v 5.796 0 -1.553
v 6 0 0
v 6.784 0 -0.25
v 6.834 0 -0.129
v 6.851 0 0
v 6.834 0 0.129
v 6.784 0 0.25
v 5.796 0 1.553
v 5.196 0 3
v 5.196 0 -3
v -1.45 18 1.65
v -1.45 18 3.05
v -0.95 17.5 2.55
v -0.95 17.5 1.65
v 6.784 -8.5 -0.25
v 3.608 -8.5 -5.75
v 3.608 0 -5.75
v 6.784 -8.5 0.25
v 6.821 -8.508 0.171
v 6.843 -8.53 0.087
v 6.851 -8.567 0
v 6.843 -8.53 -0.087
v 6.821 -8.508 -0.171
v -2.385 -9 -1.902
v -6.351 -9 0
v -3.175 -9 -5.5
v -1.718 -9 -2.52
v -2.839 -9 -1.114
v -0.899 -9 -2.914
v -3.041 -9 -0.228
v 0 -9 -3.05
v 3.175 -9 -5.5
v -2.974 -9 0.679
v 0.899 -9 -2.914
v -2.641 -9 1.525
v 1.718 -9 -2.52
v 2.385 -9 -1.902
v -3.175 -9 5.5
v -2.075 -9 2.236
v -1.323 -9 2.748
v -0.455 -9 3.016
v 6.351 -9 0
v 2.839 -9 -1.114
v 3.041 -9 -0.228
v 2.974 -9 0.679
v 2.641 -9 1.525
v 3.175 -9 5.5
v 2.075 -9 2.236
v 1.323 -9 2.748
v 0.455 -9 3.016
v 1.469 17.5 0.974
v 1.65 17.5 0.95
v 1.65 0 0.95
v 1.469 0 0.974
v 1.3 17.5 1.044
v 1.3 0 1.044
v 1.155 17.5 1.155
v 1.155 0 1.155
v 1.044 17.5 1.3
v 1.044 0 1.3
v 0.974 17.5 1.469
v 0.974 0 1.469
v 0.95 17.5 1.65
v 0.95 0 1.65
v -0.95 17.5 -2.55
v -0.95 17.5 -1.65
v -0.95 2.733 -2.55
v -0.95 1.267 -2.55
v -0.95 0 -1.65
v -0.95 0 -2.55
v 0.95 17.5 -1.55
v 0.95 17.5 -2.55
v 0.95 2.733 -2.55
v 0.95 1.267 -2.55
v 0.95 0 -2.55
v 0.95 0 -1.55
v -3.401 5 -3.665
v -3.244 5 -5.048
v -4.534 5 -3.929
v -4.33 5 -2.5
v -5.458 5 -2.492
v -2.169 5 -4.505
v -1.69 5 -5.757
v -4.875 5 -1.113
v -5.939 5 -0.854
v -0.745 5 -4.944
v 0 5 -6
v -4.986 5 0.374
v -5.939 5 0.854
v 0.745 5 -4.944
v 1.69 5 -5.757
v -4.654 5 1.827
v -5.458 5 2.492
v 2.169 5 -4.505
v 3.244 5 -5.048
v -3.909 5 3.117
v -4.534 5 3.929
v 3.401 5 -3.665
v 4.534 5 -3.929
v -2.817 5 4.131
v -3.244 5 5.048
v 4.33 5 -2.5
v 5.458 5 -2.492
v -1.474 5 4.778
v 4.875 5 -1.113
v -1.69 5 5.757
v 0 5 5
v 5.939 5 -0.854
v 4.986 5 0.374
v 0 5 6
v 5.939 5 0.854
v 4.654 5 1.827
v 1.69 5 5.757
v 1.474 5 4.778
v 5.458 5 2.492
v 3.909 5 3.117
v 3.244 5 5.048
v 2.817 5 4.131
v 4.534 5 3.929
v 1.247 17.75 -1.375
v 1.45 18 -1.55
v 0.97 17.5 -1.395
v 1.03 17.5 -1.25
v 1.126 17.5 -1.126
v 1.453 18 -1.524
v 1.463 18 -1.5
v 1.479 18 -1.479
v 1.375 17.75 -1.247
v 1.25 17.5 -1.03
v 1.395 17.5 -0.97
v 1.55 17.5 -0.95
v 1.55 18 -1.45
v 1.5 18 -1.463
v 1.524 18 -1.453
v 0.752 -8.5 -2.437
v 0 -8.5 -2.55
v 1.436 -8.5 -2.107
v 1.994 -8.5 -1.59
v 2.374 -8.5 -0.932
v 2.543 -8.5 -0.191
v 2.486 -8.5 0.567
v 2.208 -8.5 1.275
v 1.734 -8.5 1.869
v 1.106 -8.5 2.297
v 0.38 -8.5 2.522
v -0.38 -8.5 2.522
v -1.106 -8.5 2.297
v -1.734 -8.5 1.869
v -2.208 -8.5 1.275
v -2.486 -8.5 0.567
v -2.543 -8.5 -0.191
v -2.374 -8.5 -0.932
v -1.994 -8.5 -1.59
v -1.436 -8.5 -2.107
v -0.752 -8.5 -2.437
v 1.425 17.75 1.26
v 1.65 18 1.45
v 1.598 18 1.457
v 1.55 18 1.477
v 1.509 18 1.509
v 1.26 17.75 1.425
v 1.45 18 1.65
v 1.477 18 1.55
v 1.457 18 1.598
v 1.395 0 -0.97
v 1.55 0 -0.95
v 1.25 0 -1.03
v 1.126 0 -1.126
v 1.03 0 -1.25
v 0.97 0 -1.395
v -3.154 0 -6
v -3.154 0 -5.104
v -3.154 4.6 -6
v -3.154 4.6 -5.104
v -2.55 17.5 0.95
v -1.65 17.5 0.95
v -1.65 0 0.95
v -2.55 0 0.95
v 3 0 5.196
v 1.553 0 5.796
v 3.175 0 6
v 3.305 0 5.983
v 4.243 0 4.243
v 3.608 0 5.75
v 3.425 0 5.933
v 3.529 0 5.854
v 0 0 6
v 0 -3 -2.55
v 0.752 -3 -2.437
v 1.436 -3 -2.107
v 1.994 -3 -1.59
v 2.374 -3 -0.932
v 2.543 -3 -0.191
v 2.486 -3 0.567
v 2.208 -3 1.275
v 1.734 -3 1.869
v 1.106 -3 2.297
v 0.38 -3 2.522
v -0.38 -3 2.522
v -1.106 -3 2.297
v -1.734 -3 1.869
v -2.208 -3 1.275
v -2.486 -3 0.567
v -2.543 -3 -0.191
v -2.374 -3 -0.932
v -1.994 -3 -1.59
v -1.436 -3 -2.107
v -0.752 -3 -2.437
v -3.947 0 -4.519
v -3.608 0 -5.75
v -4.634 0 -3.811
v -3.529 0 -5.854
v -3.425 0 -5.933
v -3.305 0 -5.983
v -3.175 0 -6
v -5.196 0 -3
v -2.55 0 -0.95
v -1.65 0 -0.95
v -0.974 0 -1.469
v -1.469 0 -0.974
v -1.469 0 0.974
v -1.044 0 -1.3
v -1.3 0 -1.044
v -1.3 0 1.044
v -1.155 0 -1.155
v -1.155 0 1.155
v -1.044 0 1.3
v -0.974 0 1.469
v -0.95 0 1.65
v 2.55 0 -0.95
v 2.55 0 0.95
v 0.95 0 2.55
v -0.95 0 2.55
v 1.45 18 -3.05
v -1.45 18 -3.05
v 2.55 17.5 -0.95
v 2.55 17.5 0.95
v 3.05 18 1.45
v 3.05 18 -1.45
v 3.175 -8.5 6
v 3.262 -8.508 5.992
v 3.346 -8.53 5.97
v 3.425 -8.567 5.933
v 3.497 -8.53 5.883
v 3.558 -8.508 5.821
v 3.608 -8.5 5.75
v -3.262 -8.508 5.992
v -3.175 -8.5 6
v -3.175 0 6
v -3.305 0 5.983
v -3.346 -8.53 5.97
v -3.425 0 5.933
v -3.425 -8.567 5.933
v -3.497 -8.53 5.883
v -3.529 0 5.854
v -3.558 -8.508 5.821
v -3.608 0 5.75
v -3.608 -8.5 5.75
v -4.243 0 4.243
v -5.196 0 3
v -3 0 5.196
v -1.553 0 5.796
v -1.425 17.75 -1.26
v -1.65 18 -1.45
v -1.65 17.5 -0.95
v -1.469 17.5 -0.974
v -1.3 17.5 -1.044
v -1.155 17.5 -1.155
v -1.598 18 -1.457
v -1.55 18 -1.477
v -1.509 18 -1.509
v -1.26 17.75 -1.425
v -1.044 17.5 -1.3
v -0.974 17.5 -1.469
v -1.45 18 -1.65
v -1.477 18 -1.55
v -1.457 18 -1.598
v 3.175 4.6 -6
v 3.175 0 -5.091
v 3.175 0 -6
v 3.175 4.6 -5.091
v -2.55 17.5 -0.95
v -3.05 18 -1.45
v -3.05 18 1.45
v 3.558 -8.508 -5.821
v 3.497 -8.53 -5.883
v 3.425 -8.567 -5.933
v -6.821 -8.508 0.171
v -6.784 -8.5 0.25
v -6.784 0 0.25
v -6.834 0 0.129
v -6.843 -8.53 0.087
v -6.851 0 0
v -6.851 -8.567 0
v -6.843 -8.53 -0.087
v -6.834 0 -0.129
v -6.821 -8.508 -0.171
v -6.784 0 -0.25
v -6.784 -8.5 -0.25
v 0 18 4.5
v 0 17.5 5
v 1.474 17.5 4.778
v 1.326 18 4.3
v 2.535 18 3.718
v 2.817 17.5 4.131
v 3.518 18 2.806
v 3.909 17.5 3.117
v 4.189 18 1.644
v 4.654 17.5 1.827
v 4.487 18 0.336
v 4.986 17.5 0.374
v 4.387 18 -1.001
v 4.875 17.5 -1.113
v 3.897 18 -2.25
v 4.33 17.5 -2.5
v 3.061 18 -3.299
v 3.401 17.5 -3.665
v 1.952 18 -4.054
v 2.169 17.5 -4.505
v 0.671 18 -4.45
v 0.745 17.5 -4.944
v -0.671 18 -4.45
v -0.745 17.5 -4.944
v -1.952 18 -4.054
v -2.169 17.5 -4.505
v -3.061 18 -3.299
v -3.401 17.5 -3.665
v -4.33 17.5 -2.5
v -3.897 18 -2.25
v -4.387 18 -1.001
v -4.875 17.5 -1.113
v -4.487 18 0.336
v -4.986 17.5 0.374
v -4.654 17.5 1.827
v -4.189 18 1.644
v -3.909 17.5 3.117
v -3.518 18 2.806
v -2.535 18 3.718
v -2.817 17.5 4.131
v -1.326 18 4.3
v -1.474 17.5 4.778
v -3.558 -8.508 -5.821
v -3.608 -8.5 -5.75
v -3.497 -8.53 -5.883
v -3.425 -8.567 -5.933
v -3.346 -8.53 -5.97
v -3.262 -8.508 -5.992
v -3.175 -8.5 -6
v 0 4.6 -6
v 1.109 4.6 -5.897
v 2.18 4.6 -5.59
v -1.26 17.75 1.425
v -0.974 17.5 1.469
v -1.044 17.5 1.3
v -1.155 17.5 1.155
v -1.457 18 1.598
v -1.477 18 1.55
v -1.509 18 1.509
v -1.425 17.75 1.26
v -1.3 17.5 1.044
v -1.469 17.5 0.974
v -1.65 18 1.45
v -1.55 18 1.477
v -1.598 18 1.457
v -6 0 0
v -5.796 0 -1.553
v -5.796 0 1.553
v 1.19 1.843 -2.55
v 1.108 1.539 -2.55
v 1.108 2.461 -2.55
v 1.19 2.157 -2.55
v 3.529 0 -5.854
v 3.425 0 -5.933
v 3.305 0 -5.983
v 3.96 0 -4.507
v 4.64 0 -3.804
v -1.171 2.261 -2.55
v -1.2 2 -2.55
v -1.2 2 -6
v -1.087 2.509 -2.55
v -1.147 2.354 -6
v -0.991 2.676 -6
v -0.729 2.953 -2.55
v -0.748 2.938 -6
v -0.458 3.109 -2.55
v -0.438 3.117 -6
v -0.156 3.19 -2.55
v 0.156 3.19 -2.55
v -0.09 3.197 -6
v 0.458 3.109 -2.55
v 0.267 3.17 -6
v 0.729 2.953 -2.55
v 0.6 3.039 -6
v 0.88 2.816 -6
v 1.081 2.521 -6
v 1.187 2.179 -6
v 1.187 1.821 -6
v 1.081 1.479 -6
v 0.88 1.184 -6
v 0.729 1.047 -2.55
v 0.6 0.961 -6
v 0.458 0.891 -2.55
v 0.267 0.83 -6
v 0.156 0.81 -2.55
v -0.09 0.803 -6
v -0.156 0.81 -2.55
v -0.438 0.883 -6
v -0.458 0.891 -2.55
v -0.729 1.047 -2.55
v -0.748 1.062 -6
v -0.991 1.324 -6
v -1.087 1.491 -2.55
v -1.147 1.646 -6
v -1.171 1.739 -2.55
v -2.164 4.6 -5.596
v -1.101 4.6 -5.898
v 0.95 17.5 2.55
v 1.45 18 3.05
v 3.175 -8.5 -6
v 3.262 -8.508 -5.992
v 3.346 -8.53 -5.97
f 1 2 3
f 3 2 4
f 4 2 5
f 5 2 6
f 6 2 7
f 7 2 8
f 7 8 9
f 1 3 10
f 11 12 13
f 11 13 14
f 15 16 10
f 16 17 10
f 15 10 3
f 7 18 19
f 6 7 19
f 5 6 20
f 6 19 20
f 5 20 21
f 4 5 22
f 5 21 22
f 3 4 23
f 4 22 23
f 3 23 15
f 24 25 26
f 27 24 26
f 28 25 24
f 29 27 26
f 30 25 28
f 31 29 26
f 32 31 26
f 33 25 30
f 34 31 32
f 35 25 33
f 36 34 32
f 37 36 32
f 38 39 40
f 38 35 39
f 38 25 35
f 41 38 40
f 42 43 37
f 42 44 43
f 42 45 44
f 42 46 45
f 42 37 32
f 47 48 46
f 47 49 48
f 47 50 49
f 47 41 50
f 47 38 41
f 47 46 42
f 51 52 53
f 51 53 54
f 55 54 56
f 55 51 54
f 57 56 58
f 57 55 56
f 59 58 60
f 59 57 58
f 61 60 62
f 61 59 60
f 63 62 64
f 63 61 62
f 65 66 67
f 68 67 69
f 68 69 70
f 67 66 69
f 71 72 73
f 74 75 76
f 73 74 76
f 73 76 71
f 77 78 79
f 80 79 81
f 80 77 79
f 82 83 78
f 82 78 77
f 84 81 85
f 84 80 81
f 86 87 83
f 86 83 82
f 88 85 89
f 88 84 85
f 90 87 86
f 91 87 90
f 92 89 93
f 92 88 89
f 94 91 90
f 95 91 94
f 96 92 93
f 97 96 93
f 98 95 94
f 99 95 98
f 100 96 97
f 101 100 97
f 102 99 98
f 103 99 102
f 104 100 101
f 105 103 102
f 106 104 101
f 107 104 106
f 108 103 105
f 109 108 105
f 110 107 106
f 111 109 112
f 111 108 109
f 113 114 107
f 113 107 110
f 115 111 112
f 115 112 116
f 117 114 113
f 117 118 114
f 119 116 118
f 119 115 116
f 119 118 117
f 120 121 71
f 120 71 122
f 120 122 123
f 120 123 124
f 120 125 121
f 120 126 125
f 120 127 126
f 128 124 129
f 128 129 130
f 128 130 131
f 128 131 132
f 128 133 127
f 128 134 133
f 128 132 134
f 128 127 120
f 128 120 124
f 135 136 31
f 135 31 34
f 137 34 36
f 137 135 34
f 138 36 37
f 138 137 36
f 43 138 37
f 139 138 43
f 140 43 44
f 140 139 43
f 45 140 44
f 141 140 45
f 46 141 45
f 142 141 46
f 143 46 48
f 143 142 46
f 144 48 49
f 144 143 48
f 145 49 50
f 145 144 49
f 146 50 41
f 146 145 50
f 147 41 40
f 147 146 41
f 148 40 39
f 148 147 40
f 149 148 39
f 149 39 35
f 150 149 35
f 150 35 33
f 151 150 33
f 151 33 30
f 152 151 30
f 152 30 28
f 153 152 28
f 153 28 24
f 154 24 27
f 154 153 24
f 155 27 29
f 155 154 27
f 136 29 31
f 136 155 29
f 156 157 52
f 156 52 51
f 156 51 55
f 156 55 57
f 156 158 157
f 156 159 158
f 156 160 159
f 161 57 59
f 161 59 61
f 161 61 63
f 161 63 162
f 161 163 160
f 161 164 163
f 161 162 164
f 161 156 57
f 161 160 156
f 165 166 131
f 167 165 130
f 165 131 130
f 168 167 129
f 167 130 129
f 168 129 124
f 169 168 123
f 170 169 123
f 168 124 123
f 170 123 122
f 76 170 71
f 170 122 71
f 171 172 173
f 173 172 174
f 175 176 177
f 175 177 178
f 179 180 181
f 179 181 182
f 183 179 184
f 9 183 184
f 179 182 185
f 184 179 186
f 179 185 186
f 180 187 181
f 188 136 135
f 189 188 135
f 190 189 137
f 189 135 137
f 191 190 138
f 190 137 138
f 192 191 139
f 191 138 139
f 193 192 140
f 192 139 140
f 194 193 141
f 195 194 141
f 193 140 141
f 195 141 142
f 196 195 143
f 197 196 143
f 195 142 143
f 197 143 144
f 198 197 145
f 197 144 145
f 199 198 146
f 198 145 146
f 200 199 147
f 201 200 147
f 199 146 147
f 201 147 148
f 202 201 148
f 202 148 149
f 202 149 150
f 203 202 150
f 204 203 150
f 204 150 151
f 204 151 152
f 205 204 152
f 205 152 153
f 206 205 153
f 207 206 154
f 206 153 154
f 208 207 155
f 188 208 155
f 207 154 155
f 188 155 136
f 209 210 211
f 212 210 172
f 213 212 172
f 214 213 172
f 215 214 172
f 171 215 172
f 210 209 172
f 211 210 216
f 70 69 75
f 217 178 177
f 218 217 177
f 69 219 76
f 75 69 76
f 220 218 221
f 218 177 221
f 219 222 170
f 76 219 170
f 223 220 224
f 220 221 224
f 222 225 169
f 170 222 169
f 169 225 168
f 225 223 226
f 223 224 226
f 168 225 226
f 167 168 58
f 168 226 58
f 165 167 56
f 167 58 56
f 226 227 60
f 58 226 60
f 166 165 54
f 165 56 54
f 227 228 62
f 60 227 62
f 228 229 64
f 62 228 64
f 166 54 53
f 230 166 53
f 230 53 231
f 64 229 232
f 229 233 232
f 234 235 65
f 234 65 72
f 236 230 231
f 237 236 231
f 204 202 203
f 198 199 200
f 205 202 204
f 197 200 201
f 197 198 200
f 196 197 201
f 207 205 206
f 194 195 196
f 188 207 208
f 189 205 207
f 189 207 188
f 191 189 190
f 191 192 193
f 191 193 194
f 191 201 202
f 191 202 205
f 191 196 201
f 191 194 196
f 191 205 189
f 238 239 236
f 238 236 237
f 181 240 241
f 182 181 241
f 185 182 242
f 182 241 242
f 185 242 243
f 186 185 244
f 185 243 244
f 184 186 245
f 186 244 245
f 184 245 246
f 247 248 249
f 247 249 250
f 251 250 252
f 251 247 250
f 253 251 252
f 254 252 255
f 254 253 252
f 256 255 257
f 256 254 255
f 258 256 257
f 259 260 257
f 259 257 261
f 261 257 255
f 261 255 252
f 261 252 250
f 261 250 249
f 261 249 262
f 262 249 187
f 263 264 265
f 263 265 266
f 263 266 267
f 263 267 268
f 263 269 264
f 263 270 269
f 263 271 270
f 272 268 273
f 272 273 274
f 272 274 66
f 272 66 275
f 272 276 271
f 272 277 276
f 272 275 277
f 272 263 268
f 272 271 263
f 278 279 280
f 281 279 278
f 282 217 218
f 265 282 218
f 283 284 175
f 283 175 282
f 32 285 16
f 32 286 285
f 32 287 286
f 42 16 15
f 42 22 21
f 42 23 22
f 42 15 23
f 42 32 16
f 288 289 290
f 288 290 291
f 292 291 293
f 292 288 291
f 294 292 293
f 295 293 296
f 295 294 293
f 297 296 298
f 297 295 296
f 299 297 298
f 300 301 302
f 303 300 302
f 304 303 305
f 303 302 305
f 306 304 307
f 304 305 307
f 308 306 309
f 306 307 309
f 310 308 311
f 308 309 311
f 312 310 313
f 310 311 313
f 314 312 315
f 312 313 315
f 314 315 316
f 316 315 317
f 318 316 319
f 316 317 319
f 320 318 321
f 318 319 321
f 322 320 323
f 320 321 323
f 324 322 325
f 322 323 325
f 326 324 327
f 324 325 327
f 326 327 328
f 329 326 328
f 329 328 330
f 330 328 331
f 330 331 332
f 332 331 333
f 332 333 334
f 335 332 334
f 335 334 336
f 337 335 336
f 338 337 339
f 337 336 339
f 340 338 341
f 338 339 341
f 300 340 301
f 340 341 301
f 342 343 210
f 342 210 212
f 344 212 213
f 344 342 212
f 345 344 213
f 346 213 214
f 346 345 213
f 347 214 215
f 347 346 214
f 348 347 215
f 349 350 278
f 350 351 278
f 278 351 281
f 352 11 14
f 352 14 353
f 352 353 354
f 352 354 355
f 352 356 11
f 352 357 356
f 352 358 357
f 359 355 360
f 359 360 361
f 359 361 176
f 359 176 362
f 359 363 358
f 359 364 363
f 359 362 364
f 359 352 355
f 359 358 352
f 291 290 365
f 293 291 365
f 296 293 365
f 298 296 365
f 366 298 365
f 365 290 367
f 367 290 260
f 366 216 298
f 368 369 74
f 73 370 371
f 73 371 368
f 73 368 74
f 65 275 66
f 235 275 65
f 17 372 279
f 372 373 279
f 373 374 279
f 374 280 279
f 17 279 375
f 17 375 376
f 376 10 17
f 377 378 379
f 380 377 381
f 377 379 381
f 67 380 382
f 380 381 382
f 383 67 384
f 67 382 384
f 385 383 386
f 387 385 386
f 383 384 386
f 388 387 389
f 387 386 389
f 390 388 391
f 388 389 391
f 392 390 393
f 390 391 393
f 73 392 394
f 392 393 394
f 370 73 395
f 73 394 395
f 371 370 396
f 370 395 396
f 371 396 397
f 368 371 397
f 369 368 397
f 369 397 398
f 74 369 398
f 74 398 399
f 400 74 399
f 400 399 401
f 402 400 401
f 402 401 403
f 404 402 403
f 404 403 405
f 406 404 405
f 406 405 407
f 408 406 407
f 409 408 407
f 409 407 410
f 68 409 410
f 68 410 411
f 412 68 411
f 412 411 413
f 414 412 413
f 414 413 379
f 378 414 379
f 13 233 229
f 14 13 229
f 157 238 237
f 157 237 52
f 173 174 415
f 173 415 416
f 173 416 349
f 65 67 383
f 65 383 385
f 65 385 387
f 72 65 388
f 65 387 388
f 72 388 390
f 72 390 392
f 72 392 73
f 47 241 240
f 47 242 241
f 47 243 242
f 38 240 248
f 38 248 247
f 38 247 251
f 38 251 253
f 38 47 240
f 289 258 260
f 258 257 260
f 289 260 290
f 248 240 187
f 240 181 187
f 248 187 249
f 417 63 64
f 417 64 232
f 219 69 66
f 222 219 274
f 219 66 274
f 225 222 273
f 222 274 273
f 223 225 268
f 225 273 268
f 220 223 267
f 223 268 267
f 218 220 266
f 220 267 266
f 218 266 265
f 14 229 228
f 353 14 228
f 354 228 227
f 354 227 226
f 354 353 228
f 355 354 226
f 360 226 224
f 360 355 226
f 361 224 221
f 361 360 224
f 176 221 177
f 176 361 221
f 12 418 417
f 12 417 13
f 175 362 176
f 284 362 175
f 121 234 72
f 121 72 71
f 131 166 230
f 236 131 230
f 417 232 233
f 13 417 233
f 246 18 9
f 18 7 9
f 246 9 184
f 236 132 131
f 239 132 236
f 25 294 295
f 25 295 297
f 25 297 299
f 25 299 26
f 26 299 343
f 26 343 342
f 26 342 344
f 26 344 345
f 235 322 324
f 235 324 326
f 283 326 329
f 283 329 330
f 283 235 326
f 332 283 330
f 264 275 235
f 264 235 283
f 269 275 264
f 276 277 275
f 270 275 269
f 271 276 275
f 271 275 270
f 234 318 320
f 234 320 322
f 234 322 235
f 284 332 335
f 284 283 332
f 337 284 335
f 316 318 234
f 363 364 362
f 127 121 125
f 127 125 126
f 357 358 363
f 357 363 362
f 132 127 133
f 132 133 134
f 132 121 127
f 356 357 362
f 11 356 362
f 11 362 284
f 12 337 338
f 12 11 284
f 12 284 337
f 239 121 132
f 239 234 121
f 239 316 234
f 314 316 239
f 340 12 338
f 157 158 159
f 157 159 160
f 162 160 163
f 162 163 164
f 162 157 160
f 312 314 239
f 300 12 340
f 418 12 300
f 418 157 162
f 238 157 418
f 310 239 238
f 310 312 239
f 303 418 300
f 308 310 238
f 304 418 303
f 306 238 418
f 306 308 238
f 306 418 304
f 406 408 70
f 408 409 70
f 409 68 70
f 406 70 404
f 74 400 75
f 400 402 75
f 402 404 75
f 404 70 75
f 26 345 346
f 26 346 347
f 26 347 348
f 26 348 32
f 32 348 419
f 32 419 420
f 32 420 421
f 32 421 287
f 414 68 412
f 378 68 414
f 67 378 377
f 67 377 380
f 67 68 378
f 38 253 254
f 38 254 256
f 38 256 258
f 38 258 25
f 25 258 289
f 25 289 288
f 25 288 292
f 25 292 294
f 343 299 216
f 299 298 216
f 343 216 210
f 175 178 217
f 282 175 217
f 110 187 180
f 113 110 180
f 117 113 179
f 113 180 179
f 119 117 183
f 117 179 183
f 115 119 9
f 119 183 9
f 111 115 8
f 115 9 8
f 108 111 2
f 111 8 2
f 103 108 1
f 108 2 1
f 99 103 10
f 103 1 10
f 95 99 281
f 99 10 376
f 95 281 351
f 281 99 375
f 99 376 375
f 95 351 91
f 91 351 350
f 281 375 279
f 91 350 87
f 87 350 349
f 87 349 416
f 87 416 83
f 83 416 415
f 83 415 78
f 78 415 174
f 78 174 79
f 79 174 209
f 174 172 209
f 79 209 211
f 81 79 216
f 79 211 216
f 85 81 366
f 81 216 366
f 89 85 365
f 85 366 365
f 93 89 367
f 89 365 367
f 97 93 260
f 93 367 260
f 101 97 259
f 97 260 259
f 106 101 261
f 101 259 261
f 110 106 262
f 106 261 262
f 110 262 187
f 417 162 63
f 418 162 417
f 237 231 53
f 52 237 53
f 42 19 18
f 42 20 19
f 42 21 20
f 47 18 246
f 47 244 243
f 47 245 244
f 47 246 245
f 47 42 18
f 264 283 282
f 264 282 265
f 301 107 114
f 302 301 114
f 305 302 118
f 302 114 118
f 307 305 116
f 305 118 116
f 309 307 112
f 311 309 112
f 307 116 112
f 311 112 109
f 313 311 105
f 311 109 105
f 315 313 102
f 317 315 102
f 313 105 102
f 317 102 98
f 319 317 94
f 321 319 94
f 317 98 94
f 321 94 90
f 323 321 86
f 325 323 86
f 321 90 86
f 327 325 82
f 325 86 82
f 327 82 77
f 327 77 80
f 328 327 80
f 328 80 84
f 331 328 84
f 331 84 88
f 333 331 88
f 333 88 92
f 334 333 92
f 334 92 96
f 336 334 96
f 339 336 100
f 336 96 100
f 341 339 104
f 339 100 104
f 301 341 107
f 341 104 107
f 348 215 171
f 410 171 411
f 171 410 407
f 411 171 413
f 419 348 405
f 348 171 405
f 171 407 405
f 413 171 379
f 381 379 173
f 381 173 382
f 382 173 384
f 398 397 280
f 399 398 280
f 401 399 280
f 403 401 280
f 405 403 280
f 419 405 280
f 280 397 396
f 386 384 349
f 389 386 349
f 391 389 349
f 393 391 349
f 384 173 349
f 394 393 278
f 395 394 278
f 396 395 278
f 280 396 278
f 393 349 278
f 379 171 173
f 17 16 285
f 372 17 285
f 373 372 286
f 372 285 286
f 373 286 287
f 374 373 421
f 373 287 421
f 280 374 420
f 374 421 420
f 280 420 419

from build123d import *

# Parameters (mm, degrees)
SKETCH_1_R          = 6
EXTRUDE_4_DEPTH     = 18
FILLET_1_R          = 0.6
FILLET_6_R          = 0.7
EXTRUDE_5_DEPTH     = 9
SKETCH_3_R          = 2.55
CUT_EXTRUDE_1_DEPTH = 6
CHAMFER_1_SIZE      = 0.5
FILLET_4_R          = 0.5
FILLET_5_R          = 0.5
SKETCH_4_W          = 6.329239392
SKETCH_4_H          = 4.6
EXTRUDE_6_DEPTH     = 3.45
SKETCH_5_R          = 1.2
CUT_EXTRUDE_2_DEPTH = 3.45
CUT_EXTRUDE_START   = -13
SKETCH_7_R          = 6
SKETCH_7_R_2        = 5
CUT_EXTRUDE_4_DEPTH = 13
CHAMFER_2_SIZE      = 0.5


with BuildPart() as part:
    # ｽｹｯﾁ1 → ﾎﾞｽ - 押し出し4 (new body)
    with BuildSketch(Plane(origin=(0, 0, 0), x_dir=(1, 0, 0), z_dir=(0, 1, 0))):
        with Locations(Location((0, 0, 0), (0, 0, 270))):
            Circle(SKETCH_1_R)
        Polygon((-2.55, -0.95), (-2.55, 0.95), (-0.95, 0.95), (-0.95, 2.55), (0.95, 2.55), (0.95, 0.95), (2.55, 0.95), (2.55, -0.95), (0.95, -0.95), (0.95, -2.55), (-0.95, -2.55), (-0.95, -0.95), align=None, mode=Mode.SUBTRACT)
    extrude(amount=EXTRUDE_4_DEPTH)

    # ﾌｨﾚｯﾄ1
    fillet_1_edges = [part.edges().sort_by_distance(p)[0] for p in [
        (0.95, 9, -0.95),
    ]]
    fillet(fillet_1_edges, radius=FILLET_1_R)

    # ﾌｨﾚｯﾄ6
    fillet_6_edges = [part.edges().sort_by_distance(p)[0] for p in [
        (-0.95, 9, -0.95),
        (-0.95, 9, 0.95),
        (0.95, 9, 0.95),
    ]]
    fillet(fillet_6_edges, radius=FILLET_6_R)

    # ｽｹｯﾁ2 → ﾎﾞｽ - 押し出し5 (add)
    with BuildSketch(Plane.XZ):
        Polygon((6.92820323, 0), (3.464101615, 6), (-3.464101615, 6), (-6.92820323, 0), (-3.464101615, -6), (3.464101615, -6), align=None)
    extrude(amount=EXTRUDE_5_DEPTH)

    # ｽｹｯﾁ3 → ｶｯﾄ - 押し出し1 (cut)
    with BuildSketch(Plane.XZ.offset(9)):
        with Locations(Location((0, 0, 0), (0, 0, 270))):
            Circle(SKETCH_3_R)
    extrude(amount=-CUT_EXTRUDE_1_DEPTH, mode=Mode.SUBTRACT)

    # 面取り1
    chamfer_1_edges = [part.edges().sort_by_distance(p)[0] for p in [
        (0, -9, 2.55),
        (5.196152423, -9, -3),
        (5.196152423, -9, 3),
        (0, -9, 6),
        (-5.196152423, -9, 3),
        (-5.196152423, -9, -3),
        (0, -9, -6),
    ]]
    chamfer(chamfer_1_edges, length=CHAMFER_1_SIZE)

    # ﾌｨﾚｯﾄ4
    fillet_4_edges = [part.edges().sort_by_distance(p)[0] for p in [
        (-3.464101615, -4.25, 6),
    ]]
    fillet(fillet_4_edges, radius=FILLET_4_R)

    # ﾌｨﾚｯﾄ5
    fillet_5_edges = [part.edges().sort_by_distance(p)[0] for p in [
        (3.464101615, -4.25, -6),
        (-3.464101615, -4.25, -6),
        (-6.92820323, -4.25, 0),
        (3.464101615, -4.25, 6),
        (6.92820323, -4.25, 0),
    ]]
    fillet(fillet_5_edges, radius=FILLET_5_R)

    # ｽｹｯﾁ4 → ﾎﾞｽ - 押し出し6 (add)
    with BuildSketch(Plane.XY.offset(-2.55)):
        with Locations((0.010806785, 2.3)):
            Rectangle(SKETCH_4_W, SKETCH_4_H)
    extrude(amount=-EXTRUDE_6_DEPTH)

    # ｽｹｯﾁ5 → ｶｯﾄ - 押し出し2 (cut)
    with BuildSketch(Plane(origin=(0, 0, -6), x_dir=(-1, 0, 0), z_dir=(0, 0, -1))):
        with Locations((0, 2)):
            Circle(SKETCH_5_R)
    extrude(amount=-CUT_EXTRUDE_2_DEPTH, mode=Mode.SUBTRACT)

    # ｽｹｯﾁ7 → ｶｯﾄ - 押し出し4 (cut)
    with BuildSketch(Plane(origin=(0, 18, 0), x_dir=(1, 0, 0), z_dir=(0, 1, 0)).offset(CUT_EXTRUDE_START)):
        with Locations(Location((0, 0, 0), (0, 0, 270))):
            Circle(SKETCH_7_R)
        with Locations(Location((0, 0, 0), (0, 0, 270))):
            Circle(SKETCH_7_R_2, mode=Mode.SUBTRACT)
    extrude(amount=CUT_EXTRUDE_4_DEPTH, mode=Mode.SUBTRACT)

    # 面取り2
    chamfer_2_edges = [part.edges().sort_by_distance(p)[0] for p in [
        (0, 18, -5),
        (2.55, 18, 0),
        (-2.1, 18, -0.95),
        (-2.1, 18, 0.95),
        (-2.55, 18, 0),
        (2.05, 18, -0.95),
        (1.125735931, 18, -1.125735931),
        (-0.95, 18, 2.1),
        (2.1, 18, 0.95),
        (0.95, 18, 2.1),
        (1.155025253, 18, 1.155025253),
        (-1.155025253, 18, -1.155025253),
        (-1.155025253, 18, 1.155025253),
        (0.95, 18, -2.05),
        (0, 18, -2.55),
        (0, 18, 2.55),
        (-0.95, 18, -2.1),
    ]]
    chamfer(chamfer_2_edges, length=CHAMFER_2_SIZE)


solid = part.part
